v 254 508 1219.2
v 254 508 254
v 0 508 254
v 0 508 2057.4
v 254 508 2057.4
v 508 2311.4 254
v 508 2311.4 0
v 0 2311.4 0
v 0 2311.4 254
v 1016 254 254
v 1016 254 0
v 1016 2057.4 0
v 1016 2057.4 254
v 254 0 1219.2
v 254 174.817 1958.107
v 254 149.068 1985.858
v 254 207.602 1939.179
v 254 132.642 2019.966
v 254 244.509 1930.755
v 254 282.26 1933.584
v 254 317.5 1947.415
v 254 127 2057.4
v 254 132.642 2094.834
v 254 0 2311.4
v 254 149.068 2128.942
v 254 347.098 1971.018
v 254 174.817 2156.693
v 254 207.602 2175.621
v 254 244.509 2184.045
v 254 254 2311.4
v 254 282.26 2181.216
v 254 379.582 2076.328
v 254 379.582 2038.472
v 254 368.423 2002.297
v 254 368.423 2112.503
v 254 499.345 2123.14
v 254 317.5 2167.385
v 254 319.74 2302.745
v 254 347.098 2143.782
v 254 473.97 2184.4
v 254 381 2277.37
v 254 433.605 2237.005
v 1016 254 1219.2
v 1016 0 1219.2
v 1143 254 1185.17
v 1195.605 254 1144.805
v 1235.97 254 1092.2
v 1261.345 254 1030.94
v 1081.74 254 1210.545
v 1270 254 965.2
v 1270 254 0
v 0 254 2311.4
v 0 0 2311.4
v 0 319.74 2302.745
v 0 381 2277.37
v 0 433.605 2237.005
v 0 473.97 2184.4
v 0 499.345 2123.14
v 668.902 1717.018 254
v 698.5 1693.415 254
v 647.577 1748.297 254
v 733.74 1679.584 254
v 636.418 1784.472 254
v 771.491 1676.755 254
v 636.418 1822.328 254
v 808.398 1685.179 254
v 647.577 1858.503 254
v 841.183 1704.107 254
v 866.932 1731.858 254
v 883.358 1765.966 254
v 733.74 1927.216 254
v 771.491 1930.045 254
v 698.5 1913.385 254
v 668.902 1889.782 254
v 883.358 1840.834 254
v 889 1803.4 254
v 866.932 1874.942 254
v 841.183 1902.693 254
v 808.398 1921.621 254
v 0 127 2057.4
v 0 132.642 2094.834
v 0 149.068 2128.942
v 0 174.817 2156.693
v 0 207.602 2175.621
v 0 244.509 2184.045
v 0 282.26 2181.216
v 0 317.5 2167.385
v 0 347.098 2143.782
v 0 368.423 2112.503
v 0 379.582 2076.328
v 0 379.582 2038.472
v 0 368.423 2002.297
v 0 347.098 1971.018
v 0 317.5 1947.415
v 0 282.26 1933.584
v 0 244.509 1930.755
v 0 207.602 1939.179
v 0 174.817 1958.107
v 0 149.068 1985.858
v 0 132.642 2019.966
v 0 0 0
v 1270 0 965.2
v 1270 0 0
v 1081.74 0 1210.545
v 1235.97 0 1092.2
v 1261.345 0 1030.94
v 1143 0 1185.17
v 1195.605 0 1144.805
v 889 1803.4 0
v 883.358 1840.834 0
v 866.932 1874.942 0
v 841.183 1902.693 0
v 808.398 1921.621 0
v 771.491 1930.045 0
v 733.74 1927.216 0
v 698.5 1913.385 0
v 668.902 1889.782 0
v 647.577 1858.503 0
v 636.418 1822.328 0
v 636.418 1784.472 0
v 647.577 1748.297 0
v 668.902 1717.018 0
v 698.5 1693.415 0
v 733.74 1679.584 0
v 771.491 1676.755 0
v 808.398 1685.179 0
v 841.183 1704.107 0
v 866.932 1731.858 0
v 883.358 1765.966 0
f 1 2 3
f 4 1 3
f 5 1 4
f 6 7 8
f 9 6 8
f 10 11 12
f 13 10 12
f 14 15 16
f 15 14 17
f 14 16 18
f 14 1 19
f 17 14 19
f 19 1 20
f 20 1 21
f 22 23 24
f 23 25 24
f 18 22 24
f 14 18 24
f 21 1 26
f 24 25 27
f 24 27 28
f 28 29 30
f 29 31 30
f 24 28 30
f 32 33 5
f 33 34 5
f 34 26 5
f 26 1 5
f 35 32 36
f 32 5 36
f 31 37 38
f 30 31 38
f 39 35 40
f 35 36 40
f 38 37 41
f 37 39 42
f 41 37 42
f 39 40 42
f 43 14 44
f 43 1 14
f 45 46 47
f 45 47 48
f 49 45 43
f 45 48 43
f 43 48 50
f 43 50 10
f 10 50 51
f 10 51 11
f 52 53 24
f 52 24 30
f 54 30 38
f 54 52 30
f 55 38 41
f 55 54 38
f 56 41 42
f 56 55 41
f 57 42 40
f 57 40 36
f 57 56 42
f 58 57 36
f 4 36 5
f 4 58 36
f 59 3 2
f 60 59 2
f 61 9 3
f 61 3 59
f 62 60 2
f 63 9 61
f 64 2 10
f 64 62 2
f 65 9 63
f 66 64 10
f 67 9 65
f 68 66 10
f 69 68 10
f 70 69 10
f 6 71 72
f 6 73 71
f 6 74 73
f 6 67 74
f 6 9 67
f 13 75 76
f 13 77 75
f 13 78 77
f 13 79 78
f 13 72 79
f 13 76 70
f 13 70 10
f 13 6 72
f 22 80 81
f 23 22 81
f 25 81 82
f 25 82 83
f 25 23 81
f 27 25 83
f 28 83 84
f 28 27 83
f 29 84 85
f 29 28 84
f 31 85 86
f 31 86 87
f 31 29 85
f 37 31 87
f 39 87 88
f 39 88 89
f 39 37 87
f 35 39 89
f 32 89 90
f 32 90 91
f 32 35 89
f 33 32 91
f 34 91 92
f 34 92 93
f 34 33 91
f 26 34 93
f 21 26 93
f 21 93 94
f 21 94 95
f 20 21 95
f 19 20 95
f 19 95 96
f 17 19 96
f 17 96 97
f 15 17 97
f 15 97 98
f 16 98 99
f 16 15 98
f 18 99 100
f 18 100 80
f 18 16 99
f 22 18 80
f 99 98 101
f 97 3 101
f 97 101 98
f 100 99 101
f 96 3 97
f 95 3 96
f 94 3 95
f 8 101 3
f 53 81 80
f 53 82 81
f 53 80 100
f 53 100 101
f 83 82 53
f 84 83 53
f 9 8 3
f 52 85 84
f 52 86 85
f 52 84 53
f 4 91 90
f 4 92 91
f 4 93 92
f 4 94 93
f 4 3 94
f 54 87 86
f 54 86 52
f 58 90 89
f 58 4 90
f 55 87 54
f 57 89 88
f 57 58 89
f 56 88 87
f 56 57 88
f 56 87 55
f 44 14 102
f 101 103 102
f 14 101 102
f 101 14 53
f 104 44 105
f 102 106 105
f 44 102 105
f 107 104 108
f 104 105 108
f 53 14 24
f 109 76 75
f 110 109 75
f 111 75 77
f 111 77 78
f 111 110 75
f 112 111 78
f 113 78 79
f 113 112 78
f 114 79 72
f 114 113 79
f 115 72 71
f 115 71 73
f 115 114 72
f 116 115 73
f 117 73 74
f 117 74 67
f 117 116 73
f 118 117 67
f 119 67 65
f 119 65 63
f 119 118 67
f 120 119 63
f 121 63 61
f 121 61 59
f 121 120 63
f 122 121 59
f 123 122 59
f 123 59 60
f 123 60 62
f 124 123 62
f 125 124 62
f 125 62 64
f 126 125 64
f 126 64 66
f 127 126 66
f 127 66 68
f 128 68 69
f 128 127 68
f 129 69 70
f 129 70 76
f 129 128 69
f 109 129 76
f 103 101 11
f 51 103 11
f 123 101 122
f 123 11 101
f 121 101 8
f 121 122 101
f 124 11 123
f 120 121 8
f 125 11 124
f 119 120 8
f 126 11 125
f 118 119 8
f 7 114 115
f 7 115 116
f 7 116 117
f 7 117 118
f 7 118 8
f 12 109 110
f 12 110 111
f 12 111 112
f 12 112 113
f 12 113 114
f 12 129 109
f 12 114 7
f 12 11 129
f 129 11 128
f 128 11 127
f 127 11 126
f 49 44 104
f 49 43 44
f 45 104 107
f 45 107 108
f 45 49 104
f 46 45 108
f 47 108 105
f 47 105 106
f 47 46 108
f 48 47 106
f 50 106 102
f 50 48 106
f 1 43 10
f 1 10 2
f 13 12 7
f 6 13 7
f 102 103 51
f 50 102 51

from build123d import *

# Parameters (mm, degrees)
SKETCH1_R           = 127
BOSS_EXTRUDE1_DEPTH = 254
BOSS_EXTRUDE2_DEPTH = 1219.2
FILLET1_R           = 254
SKETCH2_W           = 2311.4
SKETCH2_H           = 508
SKETCH2_R           = 127
BOSS_EXTRUDE3_DEPTH = 254
FILLET2_R           = 254


with BuildPart() as part:
    # Sketch1 → Boss-Extrude1 (new body)
    with BuildSketch(Plane.XY):
        Polygon((0, 2311.4), (0, 508), (254, 508), (1016, 254), (1016, 2057.4), (508, 2311.4), align=None)
        with Locations((762, 1803.4)):
            Circle(SKETCH1_R, mode=Mode.SUBTRACT)
    extrude(amount=BOSS_EXTRUDE1_DEPTH)

    # Sketch1<3> → Boss-Extrude2 (add)
    with BuildSketch(Plane.XY):
        Polygon((254, 508), (254, 0), (1270, 0), (1270, 254), (1016, 254), align=None)
    extrude(amount=BOSS_EXTRUDE2_DEPTH)

    # Fillet1
    fillet1_edges = [part.edges().sort_by_distance(p)[0] for p in [
        (1270, 127, 1219.2),
    ]]
    fillet(fillet1_edges, radius=FILLET1_R)

    # Sketch2 → Boss-Extrude3 (add)
    with BuildSketch(Plane.ZY.offset(-254)):
        with Locations((1155.7, 254)):
            Rectangle(SKETCH2_W, SKETCH2_H)
        with Locations((2057.4, 254)):
            Circle(SKETCH2_R, mode=Mode.SUBTRACT)
    extrude(amount=BOSS_EXTRUDE3_DEPTH)

    # Fillet2
    fillet2_edges = [part.edges().sort_by_distance(p)[0] for p in [
        (127, 508, 2311.4),
    ]]
    fillet(fillet2_edges, radius=FILLET2_R)


solid = part.part
